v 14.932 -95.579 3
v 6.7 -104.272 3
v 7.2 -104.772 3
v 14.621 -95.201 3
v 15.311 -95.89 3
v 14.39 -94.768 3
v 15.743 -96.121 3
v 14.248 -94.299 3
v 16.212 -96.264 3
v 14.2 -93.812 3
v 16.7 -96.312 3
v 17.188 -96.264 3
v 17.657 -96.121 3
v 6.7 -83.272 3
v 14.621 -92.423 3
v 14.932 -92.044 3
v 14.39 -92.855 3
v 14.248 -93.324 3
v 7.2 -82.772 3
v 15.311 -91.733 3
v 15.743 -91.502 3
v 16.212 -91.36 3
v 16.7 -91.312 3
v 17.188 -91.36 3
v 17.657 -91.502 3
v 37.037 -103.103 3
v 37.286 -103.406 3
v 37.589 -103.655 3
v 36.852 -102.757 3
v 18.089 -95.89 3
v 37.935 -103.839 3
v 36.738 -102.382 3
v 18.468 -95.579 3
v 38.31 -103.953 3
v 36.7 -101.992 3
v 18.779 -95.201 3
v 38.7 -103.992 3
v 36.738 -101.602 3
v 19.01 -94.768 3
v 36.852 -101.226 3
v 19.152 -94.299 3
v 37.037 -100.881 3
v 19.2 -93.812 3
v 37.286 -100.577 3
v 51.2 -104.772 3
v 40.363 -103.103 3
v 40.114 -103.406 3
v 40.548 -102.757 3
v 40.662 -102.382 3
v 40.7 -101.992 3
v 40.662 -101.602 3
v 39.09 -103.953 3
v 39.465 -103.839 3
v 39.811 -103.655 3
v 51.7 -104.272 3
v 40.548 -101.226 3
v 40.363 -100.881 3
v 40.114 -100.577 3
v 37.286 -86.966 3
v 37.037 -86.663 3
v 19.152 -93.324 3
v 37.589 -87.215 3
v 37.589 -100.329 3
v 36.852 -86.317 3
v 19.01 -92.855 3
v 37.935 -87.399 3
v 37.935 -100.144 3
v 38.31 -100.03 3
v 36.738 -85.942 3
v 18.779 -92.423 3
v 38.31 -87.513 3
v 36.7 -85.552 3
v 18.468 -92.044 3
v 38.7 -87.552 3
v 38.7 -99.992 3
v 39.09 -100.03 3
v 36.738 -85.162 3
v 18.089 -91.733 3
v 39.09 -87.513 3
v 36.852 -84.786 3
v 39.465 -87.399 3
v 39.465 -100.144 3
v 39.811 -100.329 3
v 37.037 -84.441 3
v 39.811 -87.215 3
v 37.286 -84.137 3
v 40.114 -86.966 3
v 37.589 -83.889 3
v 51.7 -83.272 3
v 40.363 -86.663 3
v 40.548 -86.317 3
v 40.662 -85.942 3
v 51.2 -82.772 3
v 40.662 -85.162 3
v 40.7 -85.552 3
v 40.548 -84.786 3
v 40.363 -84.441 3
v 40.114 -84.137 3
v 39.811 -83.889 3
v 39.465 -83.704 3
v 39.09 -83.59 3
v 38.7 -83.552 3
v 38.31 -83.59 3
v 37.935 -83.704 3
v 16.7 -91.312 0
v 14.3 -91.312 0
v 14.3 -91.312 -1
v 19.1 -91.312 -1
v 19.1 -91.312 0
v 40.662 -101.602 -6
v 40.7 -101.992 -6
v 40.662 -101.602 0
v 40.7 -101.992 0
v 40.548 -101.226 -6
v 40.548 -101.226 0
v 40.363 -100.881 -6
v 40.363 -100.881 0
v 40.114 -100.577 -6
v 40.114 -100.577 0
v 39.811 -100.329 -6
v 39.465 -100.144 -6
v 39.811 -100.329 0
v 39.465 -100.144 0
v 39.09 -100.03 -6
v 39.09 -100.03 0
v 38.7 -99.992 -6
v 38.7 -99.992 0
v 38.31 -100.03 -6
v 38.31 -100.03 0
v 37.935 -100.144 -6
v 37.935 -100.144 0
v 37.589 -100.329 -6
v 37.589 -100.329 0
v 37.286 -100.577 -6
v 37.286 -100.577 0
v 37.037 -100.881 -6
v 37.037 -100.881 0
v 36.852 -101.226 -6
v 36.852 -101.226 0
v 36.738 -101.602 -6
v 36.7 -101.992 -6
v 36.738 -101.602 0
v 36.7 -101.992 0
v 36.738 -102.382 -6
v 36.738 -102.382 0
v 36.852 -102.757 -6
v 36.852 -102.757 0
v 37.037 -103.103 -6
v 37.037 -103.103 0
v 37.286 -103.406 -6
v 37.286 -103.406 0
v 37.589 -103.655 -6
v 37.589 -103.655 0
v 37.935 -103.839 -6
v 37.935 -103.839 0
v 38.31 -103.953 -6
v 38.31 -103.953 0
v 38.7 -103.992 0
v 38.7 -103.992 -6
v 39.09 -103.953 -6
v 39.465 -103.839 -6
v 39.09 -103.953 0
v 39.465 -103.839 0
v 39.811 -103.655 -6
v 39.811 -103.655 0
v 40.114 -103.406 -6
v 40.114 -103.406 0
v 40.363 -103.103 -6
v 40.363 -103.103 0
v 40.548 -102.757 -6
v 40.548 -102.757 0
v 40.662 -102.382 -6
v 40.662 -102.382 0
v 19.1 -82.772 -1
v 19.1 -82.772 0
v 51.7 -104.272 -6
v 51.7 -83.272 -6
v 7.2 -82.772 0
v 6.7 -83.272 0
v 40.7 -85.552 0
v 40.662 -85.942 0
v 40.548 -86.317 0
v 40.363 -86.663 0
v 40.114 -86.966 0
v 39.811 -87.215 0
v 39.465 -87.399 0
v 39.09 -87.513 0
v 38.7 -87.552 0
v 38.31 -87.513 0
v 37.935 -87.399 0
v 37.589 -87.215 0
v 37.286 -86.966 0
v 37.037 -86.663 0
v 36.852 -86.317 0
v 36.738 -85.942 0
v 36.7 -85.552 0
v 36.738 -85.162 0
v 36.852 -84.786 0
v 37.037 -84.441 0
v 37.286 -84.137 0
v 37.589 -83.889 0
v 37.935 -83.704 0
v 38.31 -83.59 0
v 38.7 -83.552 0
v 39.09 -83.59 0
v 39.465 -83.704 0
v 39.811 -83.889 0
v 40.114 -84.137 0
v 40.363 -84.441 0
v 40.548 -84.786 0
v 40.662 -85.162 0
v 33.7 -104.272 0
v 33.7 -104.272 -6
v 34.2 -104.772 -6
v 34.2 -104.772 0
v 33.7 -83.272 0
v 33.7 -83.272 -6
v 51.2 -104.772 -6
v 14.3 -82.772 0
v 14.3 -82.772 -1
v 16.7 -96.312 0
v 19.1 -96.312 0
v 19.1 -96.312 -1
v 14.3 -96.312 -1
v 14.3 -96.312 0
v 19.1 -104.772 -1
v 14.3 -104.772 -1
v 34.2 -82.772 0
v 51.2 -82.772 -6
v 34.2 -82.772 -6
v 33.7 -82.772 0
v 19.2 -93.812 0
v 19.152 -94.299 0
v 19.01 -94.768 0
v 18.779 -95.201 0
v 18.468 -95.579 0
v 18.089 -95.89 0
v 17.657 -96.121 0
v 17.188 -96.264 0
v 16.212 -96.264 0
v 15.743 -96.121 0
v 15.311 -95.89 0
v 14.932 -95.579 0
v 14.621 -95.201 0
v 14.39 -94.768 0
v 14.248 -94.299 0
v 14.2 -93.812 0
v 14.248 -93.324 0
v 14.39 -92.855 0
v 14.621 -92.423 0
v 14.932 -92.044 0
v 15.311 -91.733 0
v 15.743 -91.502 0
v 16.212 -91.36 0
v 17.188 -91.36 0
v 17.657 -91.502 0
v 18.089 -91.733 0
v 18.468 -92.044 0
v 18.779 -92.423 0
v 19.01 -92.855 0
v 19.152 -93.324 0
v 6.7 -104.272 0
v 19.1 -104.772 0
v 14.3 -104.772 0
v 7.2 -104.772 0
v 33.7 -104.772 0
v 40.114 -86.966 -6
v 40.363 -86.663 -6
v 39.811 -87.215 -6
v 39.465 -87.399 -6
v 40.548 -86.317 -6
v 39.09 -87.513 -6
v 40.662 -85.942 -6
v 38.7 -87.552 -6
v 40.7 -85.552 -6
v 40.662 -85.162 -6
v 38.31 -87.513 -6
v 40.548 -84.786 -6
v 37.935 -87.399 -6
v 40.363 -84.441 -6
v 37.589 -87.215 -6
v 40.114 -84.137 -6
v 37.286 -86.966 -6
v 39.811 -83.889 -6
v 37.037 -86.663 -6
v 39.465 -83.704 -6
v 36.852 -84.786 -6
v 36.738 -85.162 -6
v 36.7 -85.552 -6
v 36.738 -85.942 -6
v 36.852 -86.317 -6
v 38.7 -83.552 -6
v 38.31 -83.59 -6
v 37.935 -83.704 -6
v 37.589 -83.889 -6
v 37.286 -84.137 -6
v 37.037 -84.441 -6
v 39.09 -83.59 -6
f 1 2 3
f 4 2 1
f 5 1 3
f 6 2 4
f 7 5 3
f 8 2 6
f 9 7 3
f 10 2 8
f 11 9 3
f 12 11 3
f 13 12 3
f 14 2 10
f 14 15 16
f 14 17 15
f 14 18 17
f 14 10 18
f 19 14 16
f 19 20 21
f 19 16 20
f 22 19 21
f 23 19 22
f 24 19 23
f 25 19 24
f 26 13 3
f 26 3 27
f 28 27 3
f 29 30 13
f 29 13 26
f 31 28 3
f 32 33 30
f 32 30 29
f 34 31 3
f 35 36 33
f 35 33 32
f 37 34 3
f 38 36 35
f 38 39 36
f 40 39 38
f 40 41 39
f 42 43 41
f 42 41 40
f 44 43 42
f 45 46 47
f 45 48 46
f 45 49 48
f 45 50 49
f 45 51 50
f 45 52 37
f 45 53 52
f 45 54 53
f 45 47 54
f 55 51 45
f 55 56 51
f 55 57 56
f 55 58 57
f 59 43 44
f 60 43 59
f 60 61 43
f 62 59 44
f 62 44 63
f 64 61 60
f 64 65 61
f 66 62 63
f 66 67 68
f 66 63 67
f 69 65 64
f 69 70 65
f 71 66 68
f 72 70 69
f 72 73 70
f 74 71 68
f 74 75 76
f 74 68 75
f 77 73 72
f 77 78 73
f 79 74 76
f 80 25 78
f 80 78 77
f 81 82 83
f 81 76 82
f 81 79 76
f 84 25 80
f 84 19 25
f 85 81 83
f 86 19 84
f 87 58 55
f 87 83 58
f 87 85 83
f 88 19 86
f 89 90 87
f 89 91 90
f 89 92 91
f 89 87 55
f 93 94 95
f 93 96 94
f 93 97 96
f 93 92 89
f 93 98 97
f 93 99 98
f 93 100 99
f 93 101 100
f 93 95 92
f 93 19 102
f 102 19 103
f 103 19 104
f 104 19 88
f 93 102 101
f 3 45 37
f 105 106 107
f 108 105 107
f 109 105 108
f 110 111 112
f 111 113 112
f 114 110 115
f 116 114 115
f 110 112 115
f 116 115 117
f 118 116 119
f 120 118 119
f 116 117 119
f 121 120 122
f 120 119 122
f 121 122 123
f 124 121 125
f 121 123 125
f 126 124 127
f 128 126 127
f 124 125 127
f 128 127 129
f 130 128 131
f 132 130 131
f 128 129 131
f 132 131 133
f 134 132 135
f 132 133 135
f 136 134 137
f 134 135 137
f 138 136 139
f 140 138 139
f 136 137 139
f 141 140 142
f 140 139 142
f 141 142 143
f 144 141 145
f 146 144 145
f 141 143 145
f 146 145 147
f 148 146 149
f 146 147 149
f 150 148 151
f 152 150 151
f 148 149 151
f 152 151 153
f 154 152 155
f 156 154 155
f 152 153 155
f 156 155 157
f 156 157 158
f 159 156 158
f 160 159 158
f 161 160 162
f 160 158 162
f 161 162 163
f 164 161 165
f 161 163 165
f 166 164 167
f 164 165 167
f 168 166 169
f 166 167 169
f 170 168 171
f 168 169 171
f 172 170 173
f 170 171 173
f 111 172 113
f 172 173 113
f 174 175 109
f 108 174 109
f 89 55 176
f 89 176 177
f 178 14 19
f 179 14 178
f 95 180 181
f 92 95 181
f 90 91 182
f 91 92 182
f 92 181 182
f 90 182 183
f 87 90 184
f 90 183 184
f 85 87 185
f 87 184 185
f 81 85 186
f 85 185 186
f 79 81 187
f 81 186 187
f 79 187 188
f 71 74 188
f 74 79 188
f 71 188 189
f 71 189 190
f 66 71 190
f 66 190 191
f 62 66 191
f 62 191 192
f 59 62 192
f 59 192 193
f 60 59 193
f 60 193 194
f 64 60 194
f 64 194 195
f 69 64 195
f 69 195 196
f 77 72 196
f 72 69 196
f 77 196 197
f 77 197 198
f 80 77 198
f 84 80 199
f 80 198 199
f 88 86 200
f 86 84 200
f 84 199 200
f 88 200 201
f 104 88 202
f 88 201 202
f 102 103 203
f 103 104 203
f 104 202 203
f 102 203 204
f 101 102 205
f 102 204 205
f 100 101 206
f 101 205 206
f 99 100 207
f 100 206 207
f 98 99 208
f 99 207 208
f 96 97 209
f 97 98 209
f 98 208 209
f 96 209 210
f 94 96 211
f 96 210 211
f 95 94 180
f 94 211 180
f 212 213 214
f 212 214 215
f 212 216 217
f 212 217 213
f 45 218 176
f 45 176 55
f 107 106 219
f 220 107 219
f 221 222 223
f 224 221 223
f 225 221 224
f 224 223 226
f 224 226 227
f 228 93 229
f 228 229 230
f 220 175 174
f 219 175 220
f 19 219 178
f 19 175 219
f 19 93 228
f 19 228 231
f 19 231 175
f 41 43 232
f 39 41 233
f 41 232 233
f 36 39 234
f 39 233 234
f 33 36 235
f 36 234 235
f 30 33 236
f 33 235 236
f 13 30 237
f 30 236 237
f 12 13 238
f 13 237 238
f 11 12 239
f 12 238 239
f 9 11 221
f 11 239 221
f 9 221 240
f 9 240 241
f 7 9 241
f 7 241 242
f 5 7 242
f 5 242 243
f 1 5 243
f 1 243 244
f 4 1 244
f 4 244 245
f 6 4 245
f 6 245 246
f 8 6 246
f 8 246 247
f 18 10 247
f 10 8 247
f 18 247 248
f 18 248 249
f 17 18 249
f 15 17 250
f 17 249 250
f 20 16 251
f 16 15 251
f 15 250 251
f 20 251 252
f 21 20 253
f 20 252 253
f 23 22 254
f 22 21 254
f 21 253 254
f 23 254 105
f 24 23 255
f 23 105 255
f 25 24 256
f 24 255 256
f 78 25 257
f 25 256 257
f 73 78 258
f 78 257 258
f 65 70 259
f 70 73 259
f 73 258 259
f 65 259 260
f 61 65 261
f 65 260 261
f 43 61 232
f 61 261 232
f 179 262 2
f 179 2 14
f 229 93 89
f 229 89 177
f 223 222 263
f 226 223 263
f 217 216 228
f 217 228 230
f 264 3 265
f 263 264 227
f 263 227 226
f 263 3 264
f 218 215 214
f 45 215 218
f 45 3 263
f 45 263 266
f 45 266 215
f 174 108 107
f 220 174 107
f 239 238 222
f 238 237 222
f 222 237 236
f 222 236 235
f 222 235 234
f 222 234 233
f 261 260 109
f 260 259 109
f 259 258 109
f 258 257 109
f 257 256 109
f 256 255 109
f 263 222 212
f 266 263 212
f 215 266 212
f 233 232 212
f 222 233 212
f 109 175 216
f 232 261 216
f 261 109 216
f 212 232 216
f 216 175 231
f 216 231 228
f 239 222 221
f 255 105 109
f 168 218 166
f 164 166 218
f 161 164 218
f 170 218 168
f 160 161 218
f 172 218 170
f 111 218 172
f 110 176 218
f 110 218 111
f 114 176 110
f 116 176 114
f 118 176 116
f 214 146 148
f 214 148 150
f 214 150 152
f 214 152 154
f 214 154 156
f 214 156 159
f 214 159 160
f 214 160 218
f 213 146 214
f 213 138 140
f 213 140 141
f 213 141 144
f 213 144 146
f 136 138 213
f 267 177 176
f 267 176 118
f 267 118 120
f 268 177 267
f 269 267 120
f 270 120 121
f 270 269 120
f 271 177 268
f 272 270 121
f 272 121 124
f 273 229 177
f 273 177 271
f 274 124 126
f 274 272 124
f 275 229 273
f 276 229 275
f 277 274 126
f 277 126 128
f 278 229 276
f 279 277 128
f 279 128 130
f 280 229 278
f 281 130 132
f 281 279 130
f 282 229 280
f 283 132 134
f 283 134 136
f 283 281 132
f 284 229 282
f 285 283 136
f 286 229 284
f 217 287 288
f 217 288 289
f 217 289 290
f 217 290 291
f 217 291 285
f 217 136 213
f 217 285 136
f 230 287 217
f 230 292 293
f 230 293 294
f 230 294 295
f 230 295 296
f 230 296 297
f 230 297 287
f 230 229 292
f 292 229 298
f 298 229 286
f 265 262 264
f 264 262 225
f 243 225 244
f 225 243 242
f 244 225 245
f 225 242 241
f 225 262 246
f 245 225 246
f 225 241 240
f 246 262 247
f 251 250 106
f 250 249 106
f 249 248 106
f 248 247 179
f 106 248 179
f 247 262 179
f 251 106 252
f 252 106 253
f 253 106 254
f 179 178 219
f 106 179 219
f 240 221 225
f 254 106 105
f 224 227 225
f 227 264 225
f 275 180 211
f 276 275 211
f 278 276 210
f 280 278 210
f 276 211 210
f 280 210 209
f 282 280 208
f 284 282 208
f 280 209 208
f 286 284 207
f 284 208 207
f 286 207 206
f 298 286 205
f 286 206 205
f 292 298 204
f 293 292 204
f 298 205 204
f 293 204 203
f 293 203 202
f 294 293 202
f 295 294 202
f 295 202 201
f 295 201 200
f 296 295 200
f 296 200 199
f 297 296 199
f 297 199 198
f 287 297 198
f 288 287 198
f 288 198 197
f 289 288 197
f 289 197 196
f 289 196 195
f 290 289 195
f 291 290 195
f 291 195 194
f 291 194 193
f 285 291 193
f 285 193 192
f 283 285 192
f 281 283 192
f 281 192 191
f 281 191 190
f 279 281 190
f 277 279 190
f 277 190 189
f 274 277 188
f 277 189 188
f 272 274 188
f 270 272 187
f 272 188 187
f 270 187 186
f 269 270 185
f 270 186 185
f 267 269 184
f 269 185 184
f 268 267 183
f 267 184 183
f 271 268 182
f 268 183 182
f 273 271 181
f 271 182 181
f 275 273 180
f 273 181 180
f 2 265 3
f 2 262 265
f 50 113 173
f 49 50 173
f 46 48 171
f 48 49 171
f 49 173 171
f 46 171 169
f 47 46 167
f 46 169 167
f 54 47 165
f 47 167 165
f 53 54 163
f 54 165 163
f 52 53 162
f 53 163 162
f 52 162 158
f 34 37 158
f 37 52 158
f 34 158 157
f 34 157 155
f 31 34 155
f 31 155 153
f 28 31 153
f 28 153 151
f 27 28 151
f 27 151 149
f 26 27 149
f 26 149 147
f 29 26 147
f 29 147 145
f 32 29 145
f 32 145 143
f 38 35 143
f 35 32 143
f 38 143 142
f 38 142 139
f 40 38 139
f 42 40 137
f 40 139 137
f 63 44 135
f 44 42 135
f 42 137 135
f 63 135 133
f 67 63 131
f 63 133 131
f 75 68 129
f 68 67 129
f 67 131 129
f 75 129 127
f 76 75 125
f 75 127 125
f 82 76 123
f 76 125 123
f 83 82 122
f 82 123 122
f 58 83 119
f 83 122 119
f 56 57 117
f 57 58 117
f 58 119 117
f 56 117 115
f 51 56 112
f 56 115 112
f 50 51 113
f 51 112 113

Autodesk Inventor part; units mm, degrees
ref_plane "YZ Plane" through (0, 0, 0) normal (1, 0, 0) x (0, 1, 0)
ref_plane "XZ Plane" through (0, 0, 0) normal (0, 1, 0) x (-1, 0, 0)
ref_plane "XY Plane" through (0, 0, 0) normal (0, 0, 1) x (1, 0, 0)
sketch "Sketch1" plane through (0, 0, 0) normal (0, 0, 1) x (1, 0, 0)
  line L0 (13.4, 187.5) -> (13.4, -187.5) projected
  line L1 (0, 187.5) -> (13.4, 187.5) projected
  line L2 (0, 187.5) -> (0, -187.5) projected
  line L3 (13.4, -187.5) -> (0, -187.5) projected
  line L4 (-6.6, 187.5) -> (-6.6, -187.5) projected
  line L5 (-11.3, 187.5) -> (-6.6, 187.5) projected
  line L6 (-11.3, 187.5) -> (-11.3, -187.5) projected
  line L7 (-6.6, -187.5) -> (-11.3, -187.5) projected
  line L8 (24.7, 187.5) -> (24.7, -187.5) projected
  line L9 (20, 187.5) -> (24.7, 187.5) projected
  line L10 (20, 187.5) -> (20, -187.5) projected
  line L11 (24.7, -187.5) -> (20, -187.5) projected
  line L12 (0, -104.7717) -> (51.7, -104.7717)
  line L13 (51.7, -104.7717) -> (51.7, -82.7717)
  line L14 (51.7, -82.7717) -> (0, -82.7717)
  line L15 (0, -82.7717) -> (0, -104.7717)
  line L16 (38.7, -104.7717) -> (38.7, -82.7717) construction
  line L17 (51.7, -93.7717) -> (36.1959, -93.7717) construction
  circle A0 centre (38.7, -101.9917) radius 2
  circle A1 centre (38.7, -85.5517) radius 2
  line L18 (13.4, -93.8117) -> (20, -93.8117) construction
  circle A2 centre (16.7, -93.8117) radius 2.5
  line L19 (6.7, -104.7717) -> (6.7, -82.7717)
  point P0 (0, 0)
  point P1 (0, -82.7717)
  dimension "d0" = 22
  dimension "d3" = 4
  dimension "d4" = 4
  dimension "d5" = 16.44
  dimension "d6" = 14
  dimension "d7" = 5
  dimension "d8" = 27
extrude "Extrusion1" add sketch "Sketch1" along normal blind 3 contours L14 L10 L12 L0 | L0 L12 L19 L14 | L14 L8 L12 L10 | L14 L13 L12 L8
sketch "Sketch2" plane through (0, 0, 0) normal (0, 0, -1) x (-1, 0, 0)
  line L0 (-14.2, 187.5) -> (-14.2, -187.5) projected
  line L1 (-19.2, 187.5) -> (-19.2, -187.5) projected
  line L2 (-51.7, -82.7717) -> (-6.7, -82.7717) projected
  line L3 (-6.7, -104.7717) -> (-51.7, -104.7717) projected
  line L4 (-51.7, -82.7717) -> (-6.7, -82.7717) projected
  line L5 (-14.3, -82.7717) -> (-19.1, -82.7717)
  line L6 (-19.1, -82.7717) -> (-19.1, -104.7717)
  line L7 (-19.1, -104.7717) -> (-14.3, -104.7717)
  line L8 (-14.3, -104.7717) -> (-14.3, -82.7717)
  circle A0 centre (-16.7, -93.8117) radius 2.5 projected
  line L9 (-19.1, -96.3117) -> (-14.3, -96.3117)
  line L10 (-14.3, -96.3117) -> (-14.3, -91.3117)
  line L11 (-14.3, -91.3117) -> (-19.1, -91.3117)
  line L12 (-19.1, -91.3117) -> (-19.1, -96.3117)
  line L13 (-19.1, -96.3117) -> (-14.3, -91.3117) construction
  line L14 (-14.3, -96.3117) -> (-19.1, -91.3117) construction
  point P0 (0, 0)
  dimension "d9" = 0.1
  dimension "d10" = 0.1
extrude "Extrusion2" add sketch "Sketch2" along normal blind 1 contours L8 L11 L6 L2 | L3 L6 L9 L8
sketch "Sketch3" plane through (0, 0, 0) normal (0, 0, -1) x (-1, 0, 0)
  line L0 (-51.7, -104.7717) -> (-51.7, -82.7717) projected
  line L1 (-6.7, -104.7717) -> (-51.7, -104.7717) projected
  line L2 (-51.7, -82.7717) -> (-33.7, -82.7717)
  line L3 (-33.7, -82.7717) -> (-33.7, -104.7717)
  line L4 (-33.7, -104.7717) -> (-51.7, -104.7717)
  line L5 (-51.7, -104.7717) -> (-51.7, -82.7717)
  point P0 (0, 0)
  dimension "d13" = 18
extrude "Extrusion3" add sketch "Sketch3" along normal blind 6
thicken "Thicken1" operation cut thickness 6 both sides no extend neighbours no toward (0, 0, -1) faces at (38.1097, -101.6818, 0)
thicken "Thicken2" operation cut thickness 6 both sides no extend neighbours no toward (0, 0, -1) faces at (38.1097, -85.2418, 0)
chamfer "Chamfer1" distance 0.5 angle 45 6 edges at (33.7, -104.7717, -3) (33.7, -82.7717, -3) (51.7, -104.7717, -1.5) (51.7, -82.7717, -1.5) (6.7, -104.7717, 1.5) (6.7, -82.7717, 1.5)
properties part number "halter_induktivsensor_klein"
